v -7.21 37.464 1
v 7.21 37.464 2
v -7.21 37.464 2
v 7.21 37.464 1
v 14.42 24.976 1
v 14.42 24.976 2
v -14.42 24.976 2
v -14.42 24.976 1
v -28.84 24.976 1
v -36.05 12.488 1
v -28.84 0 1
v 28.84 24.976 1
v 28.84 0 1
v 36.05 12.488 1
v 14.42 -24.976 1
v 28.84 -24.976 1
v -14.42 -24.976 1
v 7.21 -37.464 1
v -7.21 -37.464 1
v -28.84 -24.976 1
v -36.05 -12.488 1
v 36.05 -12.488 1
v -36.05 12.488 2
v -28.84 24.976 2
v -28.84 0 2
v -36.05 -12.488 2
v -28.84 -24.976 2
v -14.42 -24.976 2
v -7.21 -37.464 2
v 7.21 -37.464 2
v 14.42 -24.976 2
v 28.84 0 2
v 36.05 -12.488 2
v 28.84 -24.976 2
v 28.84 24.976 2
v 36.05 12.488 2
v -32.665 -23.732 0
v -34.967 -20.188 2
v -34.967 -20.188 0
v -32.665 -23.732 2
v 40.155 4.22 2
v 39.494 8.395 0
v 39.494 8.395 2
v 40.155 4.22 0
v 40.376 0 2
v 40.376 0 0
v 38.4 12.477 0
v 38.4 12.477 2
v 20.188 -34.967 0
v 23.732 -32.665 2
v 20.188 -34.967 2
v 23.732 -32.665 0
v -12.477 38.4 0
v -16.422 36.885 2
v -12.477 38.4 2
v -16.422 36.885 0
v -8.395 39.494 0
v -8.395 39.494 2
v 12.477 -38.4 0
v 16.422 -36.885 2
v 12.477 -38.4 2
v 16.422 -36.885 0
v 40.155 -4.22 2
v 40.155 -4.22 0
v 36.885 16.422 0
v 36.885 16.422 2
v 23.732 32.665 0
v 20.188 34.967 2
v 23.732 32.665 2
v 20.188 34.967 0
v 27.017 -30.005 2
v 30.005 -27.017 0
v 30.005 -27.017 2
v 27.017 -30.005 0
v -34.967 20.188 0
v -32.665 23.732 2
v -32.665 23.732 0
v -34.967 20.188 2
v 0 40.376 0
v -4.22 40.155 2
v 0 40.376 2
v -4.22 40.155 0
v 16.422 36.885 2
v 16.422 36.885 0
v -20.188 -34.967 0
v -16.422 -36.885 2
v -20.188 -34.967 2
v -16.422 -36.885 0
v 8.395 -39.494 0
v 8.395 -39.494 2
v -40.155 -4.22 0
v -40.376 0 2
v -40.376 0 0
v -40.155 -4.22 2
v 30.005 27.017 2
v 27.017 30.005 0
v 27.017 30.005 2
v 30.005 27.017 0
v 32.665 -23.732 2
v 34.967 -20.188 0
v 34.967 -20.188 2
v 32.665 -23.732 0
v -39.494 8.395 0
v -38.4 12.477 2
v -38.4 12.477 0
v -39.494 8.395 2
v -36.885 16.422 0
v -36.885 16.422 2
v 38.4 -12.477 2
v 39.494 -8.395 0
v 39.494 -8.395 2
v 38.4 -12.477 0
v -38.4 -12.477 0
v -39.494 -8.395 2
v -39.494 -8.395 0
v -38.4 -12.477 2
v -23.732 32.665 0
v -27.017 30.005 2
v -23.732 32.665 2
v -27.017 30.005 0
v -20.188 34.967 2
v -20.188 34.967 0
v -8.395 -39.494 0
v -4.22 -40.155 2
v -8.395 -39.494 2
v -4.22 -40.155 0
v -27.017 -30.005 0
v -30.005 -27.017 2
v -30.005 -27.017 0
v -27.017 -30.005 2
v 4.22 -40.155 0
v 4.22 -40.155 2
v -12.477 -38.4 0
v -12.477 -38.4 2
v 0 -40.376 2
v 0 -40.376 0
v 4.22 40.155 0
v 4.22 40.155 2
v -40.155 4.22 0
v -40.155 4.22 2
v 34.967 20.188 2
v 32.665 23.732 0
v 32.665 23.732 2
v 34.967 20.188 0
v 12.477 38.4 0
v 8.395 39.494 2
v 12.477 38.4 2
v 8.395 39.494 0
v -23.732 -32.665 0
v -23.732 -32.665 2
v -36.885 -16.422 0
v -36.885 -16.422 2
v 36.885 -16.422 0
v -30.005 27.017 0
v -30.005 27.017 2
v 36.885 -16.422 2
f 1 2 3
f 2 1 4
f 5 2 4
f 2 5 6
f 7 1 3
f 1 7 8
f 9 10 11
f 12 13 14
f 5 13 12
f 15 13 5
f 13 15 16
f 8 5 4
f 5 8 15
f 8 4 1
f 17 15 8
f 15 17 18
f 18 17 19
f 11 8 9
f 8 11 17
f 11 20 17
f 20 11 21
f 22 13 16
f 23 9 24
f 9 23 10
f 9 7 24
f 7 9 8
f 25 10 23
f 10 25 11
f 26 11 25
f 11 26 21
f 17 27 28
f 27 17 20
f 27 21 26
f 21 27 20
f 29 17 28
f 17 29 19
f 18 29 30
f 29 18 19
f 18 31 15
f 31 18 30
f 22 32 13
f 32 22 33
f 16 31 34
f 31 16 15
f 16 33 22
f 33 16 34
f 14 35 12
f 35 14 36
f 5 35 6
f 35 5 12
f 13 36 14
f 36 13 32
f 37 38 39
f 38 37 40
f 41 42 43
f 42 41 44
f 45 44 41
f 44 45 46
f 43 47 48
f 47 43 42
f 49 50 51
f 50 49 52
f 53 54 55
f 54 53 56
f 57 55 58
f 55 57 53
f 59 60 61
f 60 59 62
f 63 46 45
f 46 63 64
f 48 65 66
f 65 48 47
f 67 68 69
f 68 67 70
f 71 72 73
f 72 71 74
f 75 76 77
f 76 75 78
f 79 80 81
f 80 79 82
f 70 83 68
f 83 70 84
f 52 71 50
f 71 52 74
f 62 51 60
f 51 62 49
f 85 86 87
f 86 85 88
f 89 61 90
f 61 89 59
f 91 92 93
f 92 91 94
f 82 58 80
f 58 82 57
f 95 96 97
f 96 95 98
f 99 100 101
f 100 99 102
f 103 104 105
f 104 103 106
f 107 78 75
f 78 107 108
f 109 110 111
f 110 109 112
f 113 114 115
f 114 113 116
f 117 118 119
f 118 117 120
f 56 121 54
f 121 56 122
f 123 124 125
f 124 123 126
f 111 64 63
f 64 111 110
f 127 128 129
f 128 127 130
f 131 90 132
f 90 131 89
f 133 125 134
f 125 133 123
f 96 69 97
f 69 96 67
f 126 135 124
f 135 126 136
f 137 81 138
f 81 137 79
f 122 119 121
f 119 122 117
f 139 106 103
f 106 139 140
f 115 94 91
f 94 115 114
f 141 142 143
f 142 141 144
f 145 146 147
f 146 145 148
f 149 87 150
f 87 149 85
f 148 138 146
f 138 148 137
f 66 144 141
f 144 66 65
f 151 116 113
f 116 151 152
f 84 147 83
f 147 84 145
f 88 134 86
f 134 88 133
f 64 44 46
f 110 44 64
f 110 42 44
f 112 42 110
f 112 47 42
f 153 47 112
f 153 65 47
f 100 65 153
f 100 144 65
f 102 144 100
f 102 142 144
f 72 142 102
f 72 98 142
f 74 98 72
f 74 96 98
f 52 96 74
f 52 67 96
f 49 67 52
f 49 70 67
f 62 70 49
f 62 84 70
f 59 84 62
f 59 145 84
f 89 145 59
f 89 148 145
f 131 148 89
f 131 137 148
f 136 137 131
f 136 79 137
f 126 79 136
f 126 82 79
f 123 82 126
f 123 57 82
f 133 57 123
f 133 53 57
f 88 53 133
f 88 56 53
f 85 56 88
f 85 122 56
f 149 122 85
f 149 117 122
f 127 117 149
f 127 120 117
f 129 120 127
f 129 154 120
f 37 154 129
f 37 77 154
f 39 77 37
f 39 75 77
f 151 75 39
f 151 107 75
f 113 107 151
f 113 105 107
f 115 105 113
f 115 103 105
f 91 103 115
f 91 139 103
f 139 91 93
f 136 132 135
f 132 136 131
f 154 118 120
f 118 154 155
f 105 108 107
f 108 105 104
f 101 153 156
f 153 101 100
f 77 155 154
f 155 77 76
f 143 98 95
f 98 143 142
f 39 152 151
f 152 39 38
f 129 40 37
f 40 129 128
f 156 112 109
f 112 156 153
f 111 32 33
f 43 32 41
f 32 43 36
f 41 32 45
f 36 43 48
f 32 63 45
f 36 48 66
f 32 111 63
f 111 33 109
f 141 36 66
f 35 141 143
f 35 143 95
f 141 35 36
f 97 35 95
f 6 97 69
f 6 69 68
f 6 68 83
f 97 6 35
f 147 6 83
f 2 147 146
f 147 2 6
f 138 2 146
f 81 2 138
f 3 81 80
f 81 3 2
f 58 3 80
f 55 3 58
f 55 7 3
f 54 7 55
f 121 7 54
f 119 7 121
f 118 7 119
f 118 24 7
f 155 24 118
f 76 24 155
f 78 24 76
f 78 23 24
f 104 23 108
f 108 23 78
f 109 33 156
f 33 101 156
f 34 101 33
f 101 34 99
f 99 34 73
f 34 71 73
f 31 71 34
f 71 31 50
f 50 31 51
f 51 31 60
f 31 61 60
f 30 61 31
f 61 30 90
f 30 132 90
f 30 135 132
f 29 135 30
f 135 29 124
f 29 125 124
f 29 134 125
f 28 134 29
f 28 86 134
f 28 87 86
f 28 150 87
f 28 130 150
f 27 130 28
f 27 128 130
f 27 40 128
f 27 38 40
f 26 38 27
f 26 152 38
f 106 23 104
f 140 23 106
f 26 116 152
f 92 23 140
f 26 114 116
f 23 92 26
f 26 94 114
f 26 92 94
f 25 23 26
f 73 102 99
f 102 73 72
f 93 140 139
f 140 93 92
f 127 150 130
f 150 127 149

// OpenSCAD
// a board for the hex game. This is really not
// necessary, but is a nice completion of the game
// and makes it mirror the triangle variant, which does
// need the board.

$piece_height = 4;
$piece_radius = (14) * 1.03;

$hex_inside = (sqrt(3)) * $piece_radius;

difference() {
  cylinder(r = $piece_radius * 2.8,
           h = 2,
           $fn = 60);

  translate([0,0,1]) { 
    cylinder(r = $piece_radius,
             h = $piece_height,
             $fn = 6);
                      
    rotation_offset = 360/6;
    for(i=[0:5]) {
      rotate([0,0,(rotation_offset * i)]) {
        translate([0,$hex_inside,0]) {
          cylinder(r = $piece_radius,
                   h = $piece_height,
                   $fn = 6);
        }
      }
    }
  }
}
